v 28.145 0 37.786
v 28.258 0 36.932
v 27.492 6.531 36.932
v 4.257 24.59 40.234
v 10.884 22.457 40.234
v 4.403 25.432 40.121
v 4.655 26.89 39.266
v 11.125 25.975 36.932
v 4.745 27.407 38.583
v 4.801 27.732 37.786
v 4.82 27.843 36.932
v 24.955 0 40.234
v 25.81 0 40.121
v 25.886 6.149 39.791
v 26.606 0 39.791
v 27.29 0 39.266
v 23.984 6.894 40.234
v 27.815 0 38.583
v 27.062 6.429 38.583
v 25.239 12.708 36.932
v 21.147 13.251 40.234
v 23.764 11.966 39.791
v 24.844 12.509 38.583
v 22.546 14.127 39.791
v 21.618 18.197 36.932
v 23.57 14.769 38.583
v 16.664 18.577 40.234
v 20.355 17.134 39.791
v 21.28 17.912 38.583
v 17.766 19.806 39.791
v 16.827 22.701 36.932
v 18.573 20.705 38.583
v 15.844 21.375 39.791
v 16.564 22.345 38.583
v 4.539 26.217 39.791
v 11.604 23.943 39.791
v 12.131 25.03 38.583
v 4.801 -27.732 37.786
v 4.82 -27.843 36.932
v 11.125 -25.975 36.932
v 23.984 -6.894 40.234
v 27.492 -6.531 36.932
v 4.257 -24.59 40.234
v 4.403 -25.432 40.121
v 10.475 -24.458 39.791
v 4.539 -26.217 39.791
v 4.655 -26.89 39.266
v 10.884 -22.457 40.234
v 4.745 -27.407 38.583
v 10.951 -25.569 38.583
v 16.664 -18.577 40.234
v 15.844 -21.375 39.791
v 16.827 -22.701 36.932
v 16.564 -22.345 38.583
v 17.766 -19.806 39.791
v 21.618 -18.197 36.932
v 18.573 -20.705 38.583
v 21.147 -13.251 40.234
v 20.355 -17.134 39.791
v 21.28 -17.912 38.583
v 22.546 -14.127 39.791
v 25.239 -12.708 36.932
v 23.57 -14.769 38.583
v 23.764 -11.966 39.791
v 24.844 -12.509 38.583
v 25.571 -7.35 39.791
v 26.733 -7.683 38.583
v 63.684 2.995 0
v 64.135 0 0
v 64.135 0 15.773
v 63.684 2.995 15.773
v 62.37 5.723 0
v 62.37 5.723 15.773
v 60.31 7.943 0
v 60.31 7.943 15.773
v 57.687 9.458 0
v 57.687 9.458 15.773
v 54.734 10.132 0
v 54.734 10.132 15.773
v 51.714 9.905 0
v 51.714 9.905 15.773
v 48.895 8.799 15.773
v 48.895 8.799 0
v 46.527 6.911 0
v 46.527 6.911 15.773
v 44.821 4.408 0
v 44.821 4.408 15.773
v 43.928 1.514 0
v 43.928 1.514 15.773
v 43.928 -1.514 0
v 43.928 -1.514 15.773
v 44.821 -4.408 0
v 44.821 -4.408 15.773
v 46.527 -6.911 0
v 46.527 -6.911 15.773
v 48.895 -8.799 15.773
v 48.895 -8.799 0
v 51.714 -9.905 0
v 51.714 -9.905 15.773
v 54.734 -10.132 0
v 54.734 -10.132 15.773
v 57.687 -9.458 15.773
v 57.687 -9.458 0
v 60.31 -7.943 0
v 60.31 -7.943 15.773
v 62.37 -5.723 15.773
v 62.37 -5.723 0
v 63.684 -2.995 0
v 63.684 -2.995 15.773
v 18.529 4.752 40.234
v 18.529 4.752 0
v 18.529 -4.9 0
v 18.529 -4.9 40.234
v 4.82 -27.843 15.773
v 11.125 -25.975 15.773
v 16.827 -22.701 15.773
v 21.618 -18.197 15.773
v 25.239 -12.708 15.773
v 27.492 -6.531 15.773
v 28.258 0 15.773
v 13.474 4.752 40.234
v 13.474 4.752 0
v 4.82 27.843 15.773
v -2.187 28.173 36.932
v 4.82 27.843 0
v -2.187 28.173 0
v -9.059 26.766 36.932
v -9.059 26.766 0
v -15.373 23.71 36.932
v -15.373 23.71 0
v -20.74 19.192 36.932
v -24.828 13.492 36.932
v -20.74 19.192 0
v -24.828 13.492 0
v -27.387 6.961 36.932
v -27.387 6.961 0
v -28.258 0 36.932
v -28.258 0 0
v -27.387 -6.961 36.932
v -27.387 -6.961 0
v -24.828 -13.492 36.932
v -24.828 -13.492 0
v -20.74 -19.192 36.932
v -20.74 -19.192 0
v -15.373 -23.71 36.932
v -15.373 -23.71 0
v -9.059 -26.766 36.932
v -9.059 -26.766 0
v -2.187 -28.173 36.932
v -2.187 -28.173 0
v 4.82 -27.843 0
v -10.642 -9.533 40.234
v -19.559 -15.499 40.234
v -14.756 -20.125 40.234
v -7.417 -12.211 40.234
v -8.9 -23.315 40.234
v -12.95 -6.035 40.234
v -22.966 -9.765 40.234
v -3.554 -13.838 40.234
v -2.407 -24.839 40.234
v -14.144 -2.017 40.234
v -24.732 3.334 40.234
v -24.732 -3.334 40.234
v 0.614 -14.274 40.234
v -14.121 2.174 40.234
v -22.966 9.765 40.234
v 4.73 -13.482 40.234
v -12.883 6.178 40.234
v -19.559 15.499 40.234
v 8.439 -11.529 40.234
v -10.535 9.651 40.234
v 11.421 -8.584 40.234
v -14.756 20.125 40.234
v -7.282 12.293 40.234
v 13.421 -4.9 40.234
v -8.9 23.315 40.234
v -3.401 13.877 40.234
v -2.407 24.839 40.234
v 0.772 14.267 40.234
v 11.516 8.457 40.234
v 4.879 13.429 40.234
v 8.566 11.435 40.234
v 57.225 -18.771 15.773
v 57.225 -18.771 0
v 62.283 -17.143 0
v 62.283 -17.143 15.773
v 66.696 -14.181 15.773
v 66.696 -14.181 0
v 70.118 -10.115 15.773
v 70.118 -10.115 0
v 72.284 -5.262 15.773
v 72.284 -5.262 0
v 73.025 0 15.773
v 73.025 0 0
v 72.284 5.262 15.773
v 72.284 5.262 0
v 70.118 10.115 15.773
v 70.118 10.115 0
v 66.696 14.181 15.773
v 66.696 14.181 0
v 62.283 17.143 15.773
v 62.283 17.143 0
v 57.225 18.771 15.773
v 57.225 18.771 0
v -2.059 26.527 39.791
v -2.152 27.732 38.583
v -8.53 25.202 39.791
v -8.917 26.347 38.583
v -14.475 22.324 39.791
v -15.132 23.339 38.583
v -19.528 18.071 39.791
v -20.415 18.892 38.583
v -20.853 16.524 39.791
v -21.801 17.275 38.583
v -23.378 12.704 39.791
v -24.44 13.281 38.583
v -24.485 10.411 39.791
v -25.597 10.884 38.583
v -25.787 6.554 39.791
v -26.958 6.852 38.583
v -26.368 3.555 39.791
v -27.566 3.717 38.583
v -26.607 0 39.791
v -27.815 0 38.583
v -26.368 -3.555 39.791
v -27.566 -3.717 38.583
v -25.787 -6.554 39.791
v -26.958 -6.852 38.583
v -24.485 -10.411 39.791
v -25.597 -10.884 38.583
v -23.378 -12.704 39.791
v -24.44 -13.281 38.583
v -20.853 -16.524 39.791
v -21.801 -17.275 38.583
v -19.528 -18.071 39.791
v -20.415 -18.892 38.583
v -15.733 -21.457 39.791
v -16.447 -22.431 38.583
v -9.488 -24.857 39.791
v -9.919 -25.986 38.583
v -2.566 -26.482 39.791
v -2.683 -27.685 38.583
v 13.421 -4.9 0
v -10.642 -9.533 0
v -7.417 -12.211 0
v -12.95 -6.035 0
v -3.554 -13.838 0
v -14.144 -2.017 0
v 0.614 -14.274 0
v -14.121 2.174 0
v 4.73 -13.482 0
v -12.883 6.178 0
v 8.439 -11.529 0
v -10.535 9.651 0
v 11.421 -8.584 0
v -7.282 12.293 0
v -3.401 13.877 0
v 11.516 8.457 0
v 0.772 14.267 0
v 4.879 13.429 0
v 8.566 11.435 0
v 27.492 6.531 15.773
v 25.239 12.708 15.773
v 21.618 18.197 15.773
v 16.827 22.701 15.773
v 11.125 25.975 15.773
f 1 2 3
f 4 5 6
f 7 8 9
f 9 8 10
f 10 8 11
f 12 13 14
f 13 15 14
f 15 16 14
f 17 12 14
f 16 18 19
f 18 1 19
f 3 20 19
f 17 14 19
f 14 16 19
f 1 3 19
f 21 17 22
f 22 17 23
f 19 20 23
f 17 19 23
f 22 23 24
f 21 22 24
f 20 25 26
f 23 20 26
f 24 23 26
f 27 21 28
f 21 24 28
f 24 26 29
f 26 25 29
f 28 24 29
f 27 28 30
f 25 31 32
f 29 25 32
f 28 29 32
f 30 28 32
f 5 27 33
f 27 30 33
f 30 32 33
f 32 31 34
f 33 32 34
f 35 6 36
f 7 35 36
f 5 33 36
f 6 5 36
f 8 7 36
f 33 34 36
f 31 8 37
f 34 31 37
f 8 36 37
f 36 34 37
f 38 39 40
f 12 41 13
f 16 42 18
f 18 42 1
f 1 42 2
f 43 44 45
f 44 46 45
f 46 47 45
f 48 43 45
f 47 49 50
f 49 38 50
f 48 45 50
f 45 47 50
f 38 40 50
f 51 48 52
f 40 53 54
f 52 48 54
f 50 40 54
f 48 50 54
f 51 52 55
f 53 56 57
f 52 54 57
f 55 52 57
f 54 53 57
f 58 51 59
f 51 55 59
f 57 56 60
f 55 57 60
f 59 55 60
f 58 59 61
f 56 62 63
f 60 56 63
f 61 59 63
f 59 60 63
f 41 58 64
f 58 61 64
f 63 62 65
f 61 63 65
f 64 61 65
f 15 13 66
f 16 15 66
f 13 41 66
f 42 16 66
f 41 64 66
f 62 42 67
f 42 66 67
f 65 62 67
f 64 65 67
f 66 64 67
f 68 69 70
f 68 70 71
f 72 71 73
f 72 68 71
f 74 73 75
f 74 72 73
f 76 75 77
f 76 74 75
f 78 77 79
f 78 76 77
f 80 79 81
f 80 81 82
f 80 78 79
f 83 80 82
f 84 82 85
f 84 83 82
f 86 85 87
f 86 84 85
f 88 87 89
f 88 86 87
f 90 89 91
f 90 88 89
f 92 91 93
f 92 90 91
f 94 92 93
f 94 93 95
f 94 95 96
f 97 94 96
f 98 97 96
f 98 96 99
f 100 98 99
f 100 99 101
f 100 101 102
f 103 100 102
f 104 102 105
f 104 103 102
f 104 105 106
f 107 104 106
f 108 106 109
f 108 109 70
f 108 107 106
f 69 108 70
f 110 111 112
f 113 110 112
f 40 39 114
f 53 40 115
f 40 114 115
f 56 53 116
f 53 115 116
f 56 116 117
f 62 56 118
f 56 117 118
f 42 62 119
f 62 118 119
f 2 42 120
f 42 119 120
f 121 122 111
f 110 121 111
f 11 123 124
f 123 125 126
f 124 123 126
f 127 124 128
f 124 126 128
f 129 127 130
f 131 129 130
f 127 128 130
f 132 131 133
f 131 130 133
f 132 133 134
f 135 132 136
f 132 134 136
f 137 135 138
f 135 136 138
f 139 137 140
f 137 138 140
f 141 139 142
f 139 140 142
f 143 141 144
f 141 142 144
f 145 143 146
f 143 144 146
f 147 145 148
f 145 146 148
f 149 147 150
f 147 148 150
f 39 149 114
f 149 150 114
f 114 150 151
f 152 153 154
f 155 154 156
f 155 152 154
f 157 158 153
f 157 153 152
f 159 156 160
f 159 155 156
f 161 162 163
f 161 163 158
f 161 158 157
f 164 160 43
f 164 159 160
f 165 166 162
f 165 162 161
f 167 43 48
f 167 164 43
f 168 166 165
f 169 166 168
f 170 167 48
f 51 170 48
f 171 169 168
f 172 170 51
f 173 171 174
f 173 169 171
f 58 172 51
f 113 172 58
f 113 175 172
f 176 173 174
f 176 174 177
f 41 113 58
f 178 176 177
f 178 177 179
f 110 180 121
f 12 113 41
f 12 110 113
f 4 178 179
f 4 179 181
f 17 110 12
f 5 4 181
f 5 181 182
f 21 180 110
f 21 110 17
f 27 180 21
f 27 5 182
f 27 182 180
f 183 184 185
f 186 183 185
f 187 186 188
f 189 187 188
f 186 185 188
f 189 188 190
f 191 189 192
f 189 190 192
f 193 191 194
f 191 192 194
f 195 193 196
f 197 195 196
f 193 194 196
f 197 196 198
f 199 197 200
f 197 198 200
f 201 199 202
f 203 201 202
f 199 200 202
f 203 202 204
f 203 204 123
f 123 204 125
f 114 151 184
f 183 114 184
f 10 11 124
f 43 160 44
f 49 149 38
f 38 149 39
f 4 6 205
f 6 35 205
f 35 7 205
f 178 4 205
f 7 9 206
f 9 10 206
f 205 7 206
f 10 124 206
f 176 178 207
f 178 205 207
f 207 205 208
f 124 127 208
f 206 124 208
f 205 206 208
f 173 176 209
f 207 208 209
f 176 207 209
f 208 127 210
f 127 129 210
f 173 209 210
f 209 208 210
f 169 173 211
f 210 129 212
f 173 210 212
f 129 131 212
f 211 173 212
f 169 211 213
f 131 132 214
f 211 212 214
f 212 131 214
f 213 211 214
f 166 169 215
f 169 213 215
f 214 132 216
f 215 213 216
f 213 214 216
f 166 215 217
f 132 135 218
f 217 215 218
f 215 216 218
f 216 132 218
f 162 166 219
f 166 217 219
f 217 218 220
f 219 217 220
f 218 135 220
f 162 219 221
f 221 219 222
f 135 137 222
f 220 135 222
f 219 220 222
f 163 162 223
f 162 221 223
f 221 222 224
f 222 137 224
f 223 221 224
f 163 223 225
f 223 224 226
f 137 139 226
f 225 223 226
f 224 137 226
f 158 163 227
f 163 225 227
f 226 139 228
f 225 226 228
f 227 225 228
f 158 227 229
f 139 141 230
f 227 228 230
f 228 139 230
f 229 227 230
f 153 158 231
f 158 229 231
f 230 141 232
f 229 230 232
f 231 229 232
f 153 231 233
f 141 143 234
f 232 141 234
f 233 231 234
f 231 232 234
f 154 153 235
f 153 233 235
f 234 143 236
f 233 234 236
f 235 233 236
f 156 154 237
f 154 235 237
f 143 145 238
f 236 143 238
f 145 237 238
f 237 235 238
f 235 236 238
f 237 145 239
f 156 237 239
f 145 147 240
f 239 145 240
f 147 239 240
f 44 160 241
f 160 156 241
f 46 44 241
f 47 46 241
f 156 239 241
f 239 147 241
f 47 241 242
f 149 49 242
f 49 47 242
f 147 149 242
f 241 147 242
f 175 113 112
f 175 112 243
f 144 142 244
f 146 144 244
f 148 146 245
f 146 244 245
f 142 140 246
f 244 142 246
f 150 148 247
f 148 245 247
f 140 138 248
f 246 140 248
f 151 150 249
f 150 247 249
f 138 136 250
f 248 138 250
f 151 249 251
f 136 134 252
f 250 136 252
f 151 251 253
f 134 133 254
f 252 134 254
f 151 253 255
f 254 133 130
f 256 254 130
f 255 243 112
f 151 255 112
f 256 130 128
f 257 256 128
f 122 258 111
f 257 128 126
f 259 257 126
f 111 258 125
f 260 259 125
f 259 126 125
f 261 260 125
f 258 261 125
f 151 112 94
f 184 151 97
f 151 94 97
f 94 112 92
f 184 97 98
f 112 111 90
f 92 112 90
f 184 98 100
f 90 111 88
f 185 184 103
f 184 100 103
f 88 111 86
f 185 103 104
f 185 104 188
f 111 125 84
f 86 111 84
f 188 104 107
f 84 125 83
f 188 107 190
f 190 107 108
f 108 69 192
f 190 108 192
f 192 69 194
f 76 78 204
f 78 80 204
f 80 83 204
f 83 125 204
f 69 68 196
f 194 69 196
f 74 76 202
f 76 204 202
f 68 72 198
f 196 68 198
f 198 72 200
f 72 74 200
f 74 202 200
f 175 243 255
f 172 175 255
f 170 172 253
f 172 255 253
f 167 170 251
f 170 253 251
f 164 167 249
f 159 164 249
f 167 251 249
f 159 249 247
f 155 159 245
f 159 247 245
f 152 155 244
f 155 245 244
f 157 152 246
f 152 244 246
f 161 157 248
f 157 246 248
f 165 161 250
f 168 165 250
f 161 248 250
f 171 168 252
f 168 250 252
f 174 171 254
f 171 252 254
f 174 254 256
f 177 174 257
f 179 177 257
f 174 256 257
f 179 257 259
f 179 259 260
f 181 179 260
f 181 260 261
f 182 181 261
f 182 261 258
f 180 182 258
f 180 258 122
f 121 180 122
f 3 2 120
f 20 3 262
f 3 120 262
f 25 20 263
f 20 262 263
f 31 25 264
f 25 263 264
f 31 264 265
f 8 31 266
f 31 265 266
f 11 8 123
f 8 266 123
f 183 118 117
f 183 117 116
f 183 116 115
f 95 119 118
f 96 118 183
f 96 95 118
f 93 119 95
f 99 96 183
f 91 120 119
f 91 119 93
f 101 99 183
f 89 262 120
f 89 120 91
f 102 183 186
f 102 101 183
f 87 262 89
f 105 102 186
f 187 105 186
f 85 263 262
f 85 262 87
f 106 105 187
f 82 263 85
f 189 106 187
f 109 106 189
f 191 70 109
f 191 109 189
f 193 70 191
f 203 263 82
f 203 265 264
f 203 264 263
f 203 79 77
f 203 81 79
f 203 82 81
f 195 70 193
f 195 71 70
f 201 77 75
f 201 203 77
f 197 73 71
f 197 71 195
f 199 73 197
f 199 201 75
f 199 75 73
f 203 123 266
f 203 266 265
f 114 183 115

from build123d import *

# Parameters (mm, degrees)
F1_DEPTH = 40.2336
F0_R     = 10.16
F2_DEPTH = 15.7734
F3_R     = 3.302


with BuildPart() as f1:
    # F0 (on Top) → F1 (new body)
    with BuildSketch(Plane.XY):
        with BuildLine():
            ThreePointArc((4.820397, -27.843313), (21.618264, -18.197169), (28.2575, 0))
            ThreePointArc((28.2575, 0), (21.618264, 18.197169), (4.820397, 27.843313))
            ThreePointArc((4.820397, 27.843313), (-28.2575, 0), (4.820397, -27.843313))
        make_face()
        with BuildLine():
            ThreePointArc((13.420816, -4.900444), (-14.287281, 0.079093), (13.474249, 4.751556))
            Line((13.474249, 4.751556), (18.5293, 4.751556))
            Line((18.5293, 4.751556), (18.5293, -4.900444))
            Line((18.5293, -4.900444), (13.420816, -4.900444))
        make_face(mode=Mode.SUBTRACT)
    extrude(amount=F1_DEPTH)

    # F0 (on Top) → F2 (join)
    with BuildSketch(Plane.XY):
        with BuildLine():
            ThreePointArc((4.820397, -27.843313), (21.618264, -18.197169), (28.2575, 0))
            ThreePointArc((28.2575, 0), (21.618264, 18.197169), (4.820397, 27.843313))
            ThreePointArc((4.820397, 27.843313), (-28.2575, 0), (4.820397, -27.843313))
        make_face()
        with BuildLine():
            ThreePointArc((13.420816, -4.900444), (-14.287281, 0.079093), (13.474249, 4.751556))
            Line((13.474249, 4.751556), (18.5293, 4.751556))
            Line((18.5293, 4.751556), (18.5293, -4.900444))
            Line((18.5293, -4.900444), (13.420816, -4.900444))
        make_face(mode=Mode.SUBTRACT)
        with BuildLine():
            ThreePointArc((4.820397, 27.843313), (21.618264, 18.197169), (28.2575, 0))
            ThreePointArc((28.2575, 0), (21.618264, -18.197169), (4.820397, -27.843313))
            Line((4.820397, -27.843313), (57.224706, -18.770773))
            ThreePointArc((57.224706, -18.770773), (73.025, 0), (57.224706, 18.770773))
            Line((57.224706, 18.770773), (4.820397, 27.843313))
        make_face()
        with Locations((53.975, 0)):
            Circle(F0_R, mode=Mode.SUBTRACT)
    extrude(amount=F2_DEPTH)

    # F3
    f3_edges = [f1.edges().sort_by_distance(p)[0] for p in [
        (-4.820397, 27.843313, 40.2336),
    ]]
    fillet(f3_edges, radius=F3_R)


solid = f1.part
